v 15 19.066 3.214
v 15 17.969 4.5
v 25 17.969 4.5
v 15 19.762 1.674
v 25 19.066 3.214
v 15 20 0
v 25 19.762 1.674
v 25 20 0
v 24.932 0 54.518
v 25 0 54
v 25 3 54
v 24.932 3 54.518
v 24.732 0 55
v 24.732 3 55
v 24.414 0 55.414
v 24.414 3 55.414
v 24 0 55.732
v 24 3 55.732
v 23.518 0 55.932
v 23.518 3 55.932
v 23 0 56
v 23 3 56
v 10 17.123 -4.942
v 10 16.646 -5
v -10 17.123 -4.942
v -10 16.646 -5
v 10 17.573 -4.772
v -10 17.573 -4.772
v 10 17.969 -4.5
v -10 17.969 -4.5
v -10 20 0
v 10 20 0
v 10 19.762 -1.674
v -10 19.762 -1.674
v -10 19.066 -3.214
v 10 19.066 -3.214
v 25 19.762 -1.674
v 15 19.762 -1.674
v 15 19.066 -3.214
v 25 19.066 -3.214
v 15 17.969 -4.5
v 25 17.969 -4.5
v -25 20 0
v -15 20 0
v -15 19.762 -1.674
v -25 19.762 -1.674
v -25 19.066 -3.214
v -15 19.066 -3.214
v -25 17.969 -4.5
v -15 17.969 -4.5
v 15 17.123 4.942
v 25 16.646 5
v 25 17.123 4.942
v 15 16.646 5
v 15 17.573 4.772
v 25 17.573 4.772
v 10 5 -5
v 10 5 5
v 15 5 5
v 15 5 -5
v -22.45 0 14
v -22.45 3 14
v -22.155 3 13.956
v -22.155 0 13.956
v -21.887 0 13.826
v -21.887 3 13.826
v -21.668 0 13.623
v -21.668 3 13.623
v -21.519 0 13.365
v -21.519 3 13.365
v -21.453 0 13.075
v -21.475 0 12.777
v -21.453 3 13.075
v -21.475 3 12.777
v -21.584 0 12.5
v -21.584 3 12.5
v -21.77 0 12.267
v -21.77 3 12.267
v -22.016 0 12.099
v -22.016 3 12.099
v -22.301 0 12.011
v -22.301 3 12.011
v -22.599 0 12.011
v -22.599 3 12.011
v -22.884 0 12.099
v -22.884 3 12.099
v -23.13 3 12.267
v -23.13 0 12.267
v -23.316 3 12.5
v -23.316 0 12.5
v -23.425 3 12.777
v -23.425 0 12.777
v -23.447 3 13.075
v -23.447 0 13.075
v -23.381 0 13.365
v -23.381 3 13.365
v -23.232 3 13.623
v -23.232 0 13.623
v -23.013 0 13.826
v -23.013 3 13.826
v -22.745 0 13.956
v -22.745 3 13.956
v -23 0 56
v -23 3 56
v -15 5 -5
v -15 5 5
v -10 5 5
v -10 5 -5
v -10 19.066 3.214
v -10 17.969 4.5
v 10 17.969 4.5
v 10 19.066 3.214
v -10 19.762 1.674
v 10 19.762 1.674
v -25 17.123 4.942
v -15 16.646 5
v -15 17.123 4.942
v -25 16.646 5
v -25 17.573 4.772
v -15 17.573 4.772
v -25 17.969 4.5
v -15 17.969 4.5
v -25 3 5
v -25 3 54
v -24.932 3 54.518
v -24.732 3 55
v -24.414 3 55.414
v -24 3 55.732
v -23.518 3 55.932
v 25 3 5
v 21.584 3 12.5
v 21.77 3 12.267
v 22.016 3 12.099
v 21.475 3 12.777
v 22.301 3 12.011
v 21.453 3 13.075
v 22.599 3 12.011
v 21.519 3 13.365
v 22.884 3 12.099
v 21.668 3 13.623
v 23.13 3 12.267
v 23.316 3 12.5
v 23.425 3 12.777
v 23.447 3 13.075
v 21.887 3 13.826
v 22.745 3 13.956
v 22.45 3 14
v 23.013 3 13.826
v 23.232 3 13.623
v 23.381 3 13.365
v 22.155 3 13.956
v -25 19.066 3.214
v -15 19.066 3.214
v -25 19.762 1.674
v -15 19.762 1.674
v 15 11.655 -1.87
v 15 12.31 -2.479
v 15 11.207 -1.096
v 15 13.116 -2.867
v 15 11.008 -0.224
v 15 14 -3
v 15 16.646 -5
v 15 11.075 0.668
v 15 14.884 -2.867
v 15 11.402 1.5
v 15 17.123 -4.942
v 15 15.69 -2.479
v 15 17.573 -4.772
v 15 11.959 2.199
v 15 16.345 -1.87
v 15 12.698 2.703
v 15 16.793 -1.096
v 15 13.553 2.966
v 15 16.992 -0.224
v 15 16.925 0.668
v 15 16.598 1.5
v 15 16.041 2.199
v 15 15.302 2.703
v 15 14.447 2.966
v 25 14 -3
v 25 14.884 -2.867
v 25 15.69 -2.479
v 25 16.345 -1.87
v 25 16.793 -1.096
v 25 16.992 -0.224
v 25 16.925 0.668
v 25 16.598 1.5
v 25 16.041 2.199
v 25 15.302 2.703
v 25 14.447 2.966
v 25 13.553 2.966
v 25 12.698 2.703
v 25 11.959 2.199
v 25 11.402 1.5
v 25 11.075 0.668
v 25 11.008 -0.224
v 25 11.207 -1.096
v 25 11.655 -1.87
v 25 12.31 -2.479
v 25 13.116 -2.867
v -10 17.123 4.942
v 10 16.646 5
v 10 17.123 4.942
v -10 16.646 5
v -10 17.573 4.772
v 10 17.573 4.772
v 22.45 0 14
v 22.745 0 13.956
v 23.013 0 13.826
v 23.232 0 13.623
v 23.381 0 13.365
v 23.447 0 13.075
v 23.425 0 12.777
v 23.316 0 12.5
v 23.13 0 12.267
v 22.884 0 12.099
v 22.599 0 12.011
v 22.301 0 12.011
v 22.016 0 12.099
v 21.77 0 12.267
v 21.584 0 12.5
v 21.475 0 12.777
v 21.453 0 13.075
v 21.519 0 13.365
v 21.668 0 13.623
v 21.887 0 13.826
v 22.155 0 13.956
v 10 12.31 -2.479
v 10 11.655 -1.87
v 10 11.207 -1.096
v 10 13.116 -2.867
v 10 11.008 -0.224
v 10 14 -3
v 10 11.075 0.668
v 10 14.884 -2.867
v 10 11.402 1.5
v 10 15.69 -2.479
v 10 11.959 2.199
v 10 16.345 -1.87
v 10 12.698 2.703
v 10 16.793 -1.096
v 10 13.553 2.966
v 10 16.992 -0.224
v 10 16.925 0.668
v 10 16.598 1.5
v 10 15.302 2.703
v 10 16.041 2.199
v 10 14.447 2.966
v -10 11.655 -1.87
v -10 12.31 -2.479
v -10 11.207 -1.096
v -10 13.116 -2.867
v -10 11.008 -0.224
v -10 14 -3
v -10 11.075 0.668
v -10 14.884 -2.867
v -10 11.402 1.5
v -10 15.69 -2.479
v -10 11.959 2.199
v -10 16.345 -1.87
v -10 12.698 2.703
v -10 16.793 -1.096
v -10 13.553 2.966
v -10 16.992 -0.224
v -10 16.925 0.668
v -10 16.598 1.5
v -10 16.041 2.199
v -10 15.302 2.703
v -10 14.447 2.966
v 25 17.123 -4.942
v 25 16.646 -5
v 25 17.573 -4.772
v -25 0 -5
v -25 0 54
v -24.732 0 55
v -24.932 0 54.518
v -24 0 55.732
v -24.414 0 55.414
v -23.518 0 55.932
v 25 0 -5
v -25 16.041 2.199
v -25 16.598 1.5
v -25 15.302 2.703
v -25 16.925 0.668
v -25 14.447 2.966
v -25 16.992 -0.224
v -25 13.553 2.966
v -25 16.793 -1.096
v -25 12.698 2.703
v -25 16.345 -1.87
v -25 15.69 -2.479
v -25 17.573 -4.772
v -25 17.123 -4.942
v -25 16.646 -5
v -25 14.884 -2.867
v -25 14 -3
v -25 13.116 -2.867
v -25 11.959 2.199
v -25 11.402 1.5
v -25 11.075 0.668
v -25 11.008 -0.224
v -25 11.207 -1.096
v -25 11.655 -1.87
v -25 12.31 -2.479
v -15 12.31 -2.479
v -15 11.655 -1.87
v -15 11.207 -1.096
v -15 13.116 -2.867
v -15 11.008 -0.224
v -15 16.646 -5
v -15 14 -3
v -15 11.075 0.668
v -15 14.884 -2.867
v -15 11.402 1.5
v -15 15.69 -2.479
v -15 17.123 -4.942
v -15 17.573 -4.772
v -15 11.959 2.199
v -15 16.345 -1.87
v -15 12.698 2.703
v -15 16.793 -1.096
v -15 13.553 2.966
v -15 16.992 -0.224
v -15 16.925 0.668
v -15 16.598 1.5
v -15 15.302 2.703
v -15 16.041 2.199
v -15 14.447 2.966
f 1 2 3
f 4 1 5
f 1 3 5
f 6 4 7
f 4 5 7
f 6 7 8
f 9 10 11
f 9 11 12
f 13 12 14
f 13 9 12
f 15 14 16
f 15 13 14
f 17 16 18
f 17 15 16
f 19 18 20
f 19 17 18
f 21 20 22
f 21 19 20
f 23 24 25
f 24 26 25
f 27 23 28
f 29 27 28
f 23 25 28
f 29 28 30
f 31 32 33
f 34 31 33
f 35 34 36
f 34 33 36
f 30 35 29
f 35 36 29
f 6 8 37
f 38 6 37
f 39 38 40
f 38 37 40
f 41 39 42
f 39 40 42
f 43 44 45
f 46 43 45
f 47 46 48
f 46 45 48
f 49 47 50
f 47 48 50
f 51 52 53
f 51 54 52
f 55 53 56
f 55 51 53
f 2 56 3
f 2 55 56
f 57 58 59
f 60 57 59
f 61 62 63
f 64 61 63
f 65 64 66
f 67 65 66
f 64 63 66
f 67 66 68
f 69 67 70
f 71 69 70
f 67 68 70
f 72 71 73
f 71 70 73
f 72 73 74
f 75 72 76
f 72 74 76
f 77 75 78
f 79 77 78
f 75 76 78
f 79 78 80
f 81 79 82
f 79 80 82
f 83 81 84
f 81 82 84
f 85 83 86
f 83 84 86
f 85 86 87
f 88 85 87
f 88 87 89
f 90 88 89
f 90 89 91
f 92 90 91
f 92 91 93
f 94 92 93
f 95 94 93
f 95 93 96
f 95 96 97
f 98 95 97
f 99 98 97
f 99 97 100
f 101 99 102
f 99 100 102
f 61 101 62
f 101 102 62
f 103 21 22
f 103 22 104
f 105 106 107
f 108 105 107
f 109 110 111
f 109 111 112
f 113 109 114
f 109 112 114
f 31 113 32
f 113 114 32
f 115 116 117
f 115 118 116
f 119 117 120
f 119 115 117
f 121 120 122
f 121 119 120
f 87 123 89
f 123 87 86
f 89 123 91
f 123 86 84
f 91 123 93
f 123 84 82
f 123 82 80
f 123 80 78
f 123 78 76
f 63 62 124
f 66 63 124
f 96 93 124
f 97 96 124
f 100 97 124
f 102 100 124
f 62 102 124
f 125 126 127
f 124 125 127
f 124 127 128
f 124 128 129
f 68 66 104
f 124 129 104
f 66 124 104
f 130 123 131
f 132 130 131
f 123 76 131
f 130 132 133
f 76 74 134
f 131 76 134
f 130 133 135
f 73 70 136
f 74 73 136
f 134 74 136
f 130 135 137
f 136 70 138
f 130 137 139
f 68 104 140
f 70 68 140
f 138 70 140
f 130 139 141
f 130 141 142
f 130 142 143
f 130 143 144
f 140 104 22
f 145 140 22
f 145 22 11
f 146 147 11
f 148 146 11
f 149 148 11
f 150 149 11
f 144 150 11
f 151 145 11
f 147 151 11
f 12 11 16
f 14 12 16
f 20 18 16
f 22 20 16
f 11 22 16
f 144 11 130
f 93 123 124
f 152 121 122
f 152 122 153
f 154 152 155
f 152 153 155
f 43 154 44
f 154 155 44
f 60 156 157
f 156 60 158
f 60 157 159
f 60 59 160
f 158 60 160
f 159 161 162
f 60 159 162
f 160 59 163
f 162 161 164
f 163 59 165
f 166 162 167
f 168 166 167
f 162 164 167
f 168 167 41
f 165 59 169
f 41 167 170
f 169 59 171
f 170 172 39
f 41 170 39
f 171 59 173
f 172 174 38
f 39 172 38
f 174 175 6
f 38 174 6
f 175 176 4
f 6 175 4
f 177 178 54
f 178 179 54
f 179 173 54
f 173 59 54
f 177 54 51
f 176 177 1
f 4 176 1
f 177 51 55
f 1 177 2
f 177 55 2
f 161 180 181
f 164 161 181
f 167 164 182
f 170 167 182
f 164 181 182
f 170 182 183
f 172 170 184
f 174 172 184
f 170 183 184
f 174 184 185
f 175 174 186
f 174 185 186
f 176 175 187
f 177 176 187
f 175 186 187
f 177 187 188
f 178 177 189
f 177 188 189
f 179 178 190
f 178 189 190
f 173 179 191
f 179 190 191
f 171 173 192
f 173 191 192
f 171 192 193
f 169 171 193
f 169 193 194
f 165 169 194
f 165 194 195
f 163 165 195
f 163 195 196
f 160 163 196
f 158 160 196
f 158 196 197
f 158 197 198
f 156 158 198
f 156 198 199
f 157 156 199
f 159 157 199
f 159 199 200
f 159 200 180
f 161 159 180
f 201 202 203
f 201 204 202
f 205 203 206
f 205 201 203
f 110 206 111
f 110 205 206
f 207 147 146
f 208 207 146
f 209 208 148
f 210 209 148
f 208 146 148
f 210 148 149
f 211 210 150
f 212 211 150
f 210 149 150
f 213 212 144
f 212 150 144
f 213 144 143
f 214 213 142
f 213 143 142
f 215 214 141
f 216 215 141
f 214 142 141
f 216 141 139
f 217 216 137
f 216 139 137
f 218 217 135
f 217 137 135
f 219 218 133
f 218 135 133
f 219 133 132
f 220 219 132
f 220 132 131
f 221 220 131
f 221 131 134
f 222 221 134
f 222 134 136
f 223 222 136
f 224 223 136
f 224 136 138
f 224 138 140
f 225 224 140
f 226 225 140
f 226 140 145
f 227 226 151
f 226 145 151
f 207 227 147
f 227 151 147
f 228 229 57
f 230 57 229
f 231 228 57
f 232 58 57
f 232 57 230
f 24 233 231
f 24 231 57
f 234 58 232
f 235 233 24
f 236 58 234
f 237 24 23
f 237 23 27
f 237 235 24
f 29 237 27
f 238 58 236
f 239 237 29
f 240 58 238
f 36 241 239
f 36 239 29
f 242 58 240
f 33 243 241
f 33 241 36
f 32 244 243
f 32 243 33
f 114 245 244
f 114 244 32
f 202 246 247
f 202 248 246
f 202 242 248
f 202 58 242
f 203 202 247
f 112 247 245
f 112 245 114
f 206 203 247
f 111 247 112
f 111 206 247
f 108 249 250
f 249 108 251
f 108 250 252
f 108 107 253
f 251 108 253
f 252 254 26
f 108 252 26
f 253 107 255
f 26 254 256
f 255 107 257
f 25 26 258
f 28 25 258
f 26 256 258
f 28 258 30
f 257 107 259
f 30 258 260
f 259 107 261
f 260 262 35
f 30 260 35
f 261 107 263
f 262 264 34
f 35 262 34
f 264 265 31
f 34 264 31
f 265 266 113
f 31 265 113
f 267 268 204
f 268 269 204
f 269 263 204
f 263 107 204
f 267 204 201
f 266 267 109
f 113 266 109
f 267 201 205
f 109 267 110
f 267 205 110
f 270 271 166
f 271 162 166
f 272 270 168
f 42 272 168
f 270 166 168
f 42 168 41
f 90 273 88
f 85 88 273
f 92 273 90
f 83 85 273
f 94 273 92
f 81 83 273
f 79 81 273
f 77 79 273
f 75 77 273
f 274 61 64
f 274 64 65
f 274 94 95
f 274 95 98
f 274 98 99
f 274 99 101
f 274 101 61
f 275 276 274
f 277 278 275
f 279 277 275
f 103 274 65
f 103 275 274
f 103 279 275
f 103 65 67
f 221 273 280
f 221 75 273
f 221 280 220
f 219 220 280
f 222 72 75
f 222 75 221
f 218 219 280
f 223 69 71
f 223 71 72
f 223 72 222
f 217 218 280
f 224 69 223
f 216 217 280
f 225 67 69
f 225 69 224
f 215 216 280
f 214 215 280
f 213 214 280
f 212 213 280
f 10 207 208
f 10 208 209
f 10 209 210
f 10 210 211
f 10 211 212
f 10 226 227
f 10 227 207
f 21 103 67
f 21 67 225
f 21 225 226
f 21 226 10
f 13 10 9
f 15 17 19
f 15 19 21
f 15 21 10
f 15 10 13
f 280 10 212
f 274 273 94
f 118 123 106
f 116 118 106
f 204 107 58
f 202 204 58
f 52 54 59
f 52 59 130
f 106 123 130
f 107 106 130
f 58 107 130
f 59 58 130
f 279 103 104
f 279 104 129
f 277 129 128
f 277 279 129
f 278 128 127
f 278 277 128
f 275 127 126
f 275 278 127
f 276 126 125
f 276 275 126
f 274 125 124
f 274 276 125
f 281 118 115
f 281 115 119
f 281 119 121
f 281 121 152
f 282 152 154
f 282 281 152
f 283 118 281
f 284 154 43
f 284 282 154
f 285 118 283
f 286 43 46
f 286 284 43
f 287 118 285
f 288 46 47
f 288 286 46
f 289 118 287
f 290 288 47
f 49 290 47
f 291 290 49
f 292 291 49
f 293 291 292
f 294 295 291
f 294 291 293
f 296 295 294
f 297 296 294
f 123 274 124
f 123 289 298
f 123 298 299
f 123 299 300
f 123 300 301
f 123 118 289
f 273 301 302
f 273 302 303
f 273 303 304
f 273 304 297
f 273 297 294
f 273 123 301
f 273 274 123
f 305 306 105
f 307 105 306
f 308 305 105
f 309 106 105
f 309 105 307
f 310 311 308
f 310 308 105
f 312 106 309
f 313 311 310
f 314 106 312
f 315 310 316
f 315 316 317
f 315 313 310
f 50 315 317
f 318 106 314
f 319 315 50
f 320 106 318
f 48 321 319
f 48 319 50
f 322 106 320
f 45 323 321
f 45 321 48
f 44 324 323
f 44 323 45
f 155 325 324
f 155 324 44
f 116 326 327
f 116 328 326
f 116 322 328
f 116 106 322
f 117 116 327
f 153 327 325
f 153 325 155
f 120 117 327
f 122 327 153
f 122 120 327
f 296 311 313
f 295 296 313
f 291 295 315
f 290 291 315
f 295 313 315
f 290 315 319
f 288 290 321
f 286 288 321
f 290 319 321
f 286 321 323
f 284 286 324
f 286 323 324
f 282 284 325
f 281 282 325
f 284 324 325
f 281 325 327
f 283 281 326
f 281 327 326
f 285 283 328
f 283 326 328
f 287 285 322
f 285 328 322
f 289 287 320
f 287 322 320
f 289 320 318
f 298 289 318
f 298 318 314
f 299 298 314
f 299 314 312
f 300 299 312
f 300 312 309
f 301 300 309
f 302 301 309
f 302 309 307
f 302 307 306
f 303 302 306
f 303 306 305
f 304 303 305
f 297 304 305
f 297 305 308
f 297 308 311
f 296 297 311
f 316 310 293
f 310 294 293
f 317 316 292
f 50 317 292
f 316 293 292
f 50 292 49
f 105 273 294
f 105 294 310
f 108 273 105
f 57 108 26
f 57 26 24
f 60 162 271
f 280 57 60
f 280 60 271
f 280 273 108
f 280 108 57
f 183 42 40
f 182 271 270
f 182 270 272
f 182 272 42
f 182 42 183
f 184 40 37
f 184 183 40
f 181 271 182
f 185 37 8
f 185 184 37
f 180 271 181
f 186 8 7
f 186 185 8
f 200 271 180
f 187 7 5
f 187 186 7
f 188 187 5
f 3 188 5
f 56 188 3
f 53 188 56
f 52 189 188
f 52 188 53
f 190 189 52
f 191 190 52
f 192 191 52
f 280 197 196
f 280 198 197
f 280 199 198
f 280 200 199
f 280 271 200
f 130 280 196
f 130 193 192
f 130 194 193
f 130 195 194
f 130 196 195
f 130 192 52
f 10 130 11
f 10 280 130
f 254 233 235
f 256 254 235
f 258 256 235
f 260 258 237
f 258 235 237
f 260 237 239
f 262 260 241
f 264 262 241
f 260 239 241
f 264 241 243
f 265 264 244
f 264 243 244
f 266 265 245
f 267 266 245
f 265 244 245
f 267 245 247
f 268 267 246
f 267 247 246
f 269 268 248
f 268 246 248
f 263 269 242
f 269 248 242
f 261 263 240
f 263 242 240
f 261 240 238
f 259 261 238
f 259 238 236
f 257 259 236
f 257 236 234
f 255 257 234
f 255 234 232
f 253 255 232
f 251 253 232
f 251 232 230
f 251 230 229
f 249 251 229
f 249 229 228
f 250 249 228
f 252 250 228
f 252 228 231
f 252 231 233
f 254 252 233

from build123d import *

# Parameters (mm, degrees)
SKETCH1_W           = 50
SKETCH1_H           = 10
BOSS_EXTRUDE1_DEPTH = 20
CUT_EXTRUDE1_DEPTH  = 70
SKETCH3_3_R         = 3
CUT_EXTRUDE2_DEPTH  = 70
SKETCH4_W           = 5
SKETCH4_H           = 15
CUT_EXTRUDE4_DEPTH  = 20
FILLET5_R           = 2
FILLET6_R           = 2
FILLET7_R           = 2
FILLET8_R           = 2
FILLET9_R           = 2
FILLET10_R          = 2
BOSS_EXTRUDE5_DEPTH = 3
SKETCH14_R          = 1
CUT_EXTRUDE5_DEPTH  = 3


with BuildPart() as part:
    # Sketch1 → Boss-Extrude1 (new body)
    with BuildSketch(Plane(origin=(0, 0, 0), x_dir=(1, 0, 0), z_dir=(0, 1, 0))):
        Rectangle(SKETCH1_W, SKETCH1_H)
    extrude(amount=BOSS_EXTRUDE1_DEPTH)

    # Sketch3 → Cut-Extrude1 (cut)
    with BuildSketch(Plane(origin=(25, 0, 0), x_dir=(0, 0, -1), z_dir=(1, 0, 0))):
        with BuildLine():
            ThreePointArc((-5, 17.31662479), (-2.837274331, 19.286764074), (0, 20))
            Line((0, 20), (-5, 20))
            Line((-5, 20), (-5, 17.31662479))
        make_face()
        with BuildLine():
            ThreePointArc((0, 20), (2.837274331, 19.286764074), (5, 17.31662479))
            Line((5, 17.31662479), (5, 20))
            Line((5, 20), (0, 20))
        make_face()
    extrude(amount=-CUT_EXTRUDE1_DEPTH, mode=Mode.SUBTRACT)

    # Sketch3<3> → Cut-Extrude2 (cut)
    with BuildSketch(Plane(origin=(25, 0, 0), x_dir=(0, 0, -1), z_dir=(1, 0, 0))):
        with Locations((0, 14)):
            Circle(SKETCH3_3_R)
    extrude(amount=-CUT_EXTRUDE2_DEPTH, mode=Mode.SUBTRACT)

    # Sketch4 → Cut-Extrude4 (cut)
    with BuildSketch(Plane.XY.offset(5)):
        with Locations((-12.5, 12.5)):
            Rectangle(SKETCH4_W, SKETCH4_H)
        with Locations((12.5, 12.5)):
            Rectangle(SKETCH4_W, SKETCH4_H)
    extrude(amount=-CUT_EXTRUDE4_DEPTH, mode=Mode.SUBTRACT)

    # Fillet5
    fillet5_edges = [part.edges().sort_by_distance(p)[0] for p in [
        (-20, 17.31662479, 5),
    ]]
    fillet(fillet5_edges, radius=FILLET5_R)

    # Fillet6
    fillet6_edges = [part.edges().sort_by_distance(p)[0] for p in [
        (0, 17.31662479, 5),
    ]]
    fillet(fillet6_edges, radius=FILLET6_R)

    # Fillet7
    fillet7_edges = [part.edges().sort_by_distance(p)[0] for p in [
        (20, 17.31662479, 5),
    ]]
    fillet(fillet7_edges, radius=FILLET7_R)

    # Fillet8
    fillet8_edges = [part.edges().sort_by_distance(p)[0] for p in [
        (20, 17.31662479, -5),
    ]]
    fillet(fillet8_edges, radius=FILLET8_R)

    # Fillet9
    fillet9_edges = [part.edges().sort_by_distance(p)[0] for p in [
        (0, 17.31662479, -5),
    ]]
    fillet(fillet9_edges, radius=FILLET9_R)

    # Fillet10
    fillet10_edges = [part.edges().sort_by_distance(p)[0] for p in [
        (-20, 17.31662479, -5),
    ]]
    fillet(fillet10_edges, radius=FILLET10_R)

    # Sketch13 → Boss-Extrude5 (add)
    with BuildSketch(Plane.XZ):
        with BuildLine():
            Line((-25, 5), (25, 5))
            Line((25, 5), (25, 54))
            ThreePointArc((25, 54), (24.414213562, 55.414213562), (23, 56))
            Line((23, 56), (-23, 56))
            ThreePointArc((-23, 56), (-24.414213562, 55.414213562), (-25, 54))
            Line((-25, 54), (-25, 5))
        make_face()
    extrude(amount=-BOSS_EXTRUDE5_DEPTH)

    # Sketch14 → Cut-Extrude5 (cut)
    with BuildSketch(Plane(origin=(0, 3, 0), x_dir=(1, 0, 0), z_dir=(0, 1, 0))):
        with Locations((-22.45, -13)):
            Circle(SKETCH14_R)
        with Locations((22.45, -13)):
            Circle(SKETCH14_R)
    extrude(amount=-CUT_EXTRUDE5_DEPTH, mode=Mode.SUBTRACT)


solid = part.part
